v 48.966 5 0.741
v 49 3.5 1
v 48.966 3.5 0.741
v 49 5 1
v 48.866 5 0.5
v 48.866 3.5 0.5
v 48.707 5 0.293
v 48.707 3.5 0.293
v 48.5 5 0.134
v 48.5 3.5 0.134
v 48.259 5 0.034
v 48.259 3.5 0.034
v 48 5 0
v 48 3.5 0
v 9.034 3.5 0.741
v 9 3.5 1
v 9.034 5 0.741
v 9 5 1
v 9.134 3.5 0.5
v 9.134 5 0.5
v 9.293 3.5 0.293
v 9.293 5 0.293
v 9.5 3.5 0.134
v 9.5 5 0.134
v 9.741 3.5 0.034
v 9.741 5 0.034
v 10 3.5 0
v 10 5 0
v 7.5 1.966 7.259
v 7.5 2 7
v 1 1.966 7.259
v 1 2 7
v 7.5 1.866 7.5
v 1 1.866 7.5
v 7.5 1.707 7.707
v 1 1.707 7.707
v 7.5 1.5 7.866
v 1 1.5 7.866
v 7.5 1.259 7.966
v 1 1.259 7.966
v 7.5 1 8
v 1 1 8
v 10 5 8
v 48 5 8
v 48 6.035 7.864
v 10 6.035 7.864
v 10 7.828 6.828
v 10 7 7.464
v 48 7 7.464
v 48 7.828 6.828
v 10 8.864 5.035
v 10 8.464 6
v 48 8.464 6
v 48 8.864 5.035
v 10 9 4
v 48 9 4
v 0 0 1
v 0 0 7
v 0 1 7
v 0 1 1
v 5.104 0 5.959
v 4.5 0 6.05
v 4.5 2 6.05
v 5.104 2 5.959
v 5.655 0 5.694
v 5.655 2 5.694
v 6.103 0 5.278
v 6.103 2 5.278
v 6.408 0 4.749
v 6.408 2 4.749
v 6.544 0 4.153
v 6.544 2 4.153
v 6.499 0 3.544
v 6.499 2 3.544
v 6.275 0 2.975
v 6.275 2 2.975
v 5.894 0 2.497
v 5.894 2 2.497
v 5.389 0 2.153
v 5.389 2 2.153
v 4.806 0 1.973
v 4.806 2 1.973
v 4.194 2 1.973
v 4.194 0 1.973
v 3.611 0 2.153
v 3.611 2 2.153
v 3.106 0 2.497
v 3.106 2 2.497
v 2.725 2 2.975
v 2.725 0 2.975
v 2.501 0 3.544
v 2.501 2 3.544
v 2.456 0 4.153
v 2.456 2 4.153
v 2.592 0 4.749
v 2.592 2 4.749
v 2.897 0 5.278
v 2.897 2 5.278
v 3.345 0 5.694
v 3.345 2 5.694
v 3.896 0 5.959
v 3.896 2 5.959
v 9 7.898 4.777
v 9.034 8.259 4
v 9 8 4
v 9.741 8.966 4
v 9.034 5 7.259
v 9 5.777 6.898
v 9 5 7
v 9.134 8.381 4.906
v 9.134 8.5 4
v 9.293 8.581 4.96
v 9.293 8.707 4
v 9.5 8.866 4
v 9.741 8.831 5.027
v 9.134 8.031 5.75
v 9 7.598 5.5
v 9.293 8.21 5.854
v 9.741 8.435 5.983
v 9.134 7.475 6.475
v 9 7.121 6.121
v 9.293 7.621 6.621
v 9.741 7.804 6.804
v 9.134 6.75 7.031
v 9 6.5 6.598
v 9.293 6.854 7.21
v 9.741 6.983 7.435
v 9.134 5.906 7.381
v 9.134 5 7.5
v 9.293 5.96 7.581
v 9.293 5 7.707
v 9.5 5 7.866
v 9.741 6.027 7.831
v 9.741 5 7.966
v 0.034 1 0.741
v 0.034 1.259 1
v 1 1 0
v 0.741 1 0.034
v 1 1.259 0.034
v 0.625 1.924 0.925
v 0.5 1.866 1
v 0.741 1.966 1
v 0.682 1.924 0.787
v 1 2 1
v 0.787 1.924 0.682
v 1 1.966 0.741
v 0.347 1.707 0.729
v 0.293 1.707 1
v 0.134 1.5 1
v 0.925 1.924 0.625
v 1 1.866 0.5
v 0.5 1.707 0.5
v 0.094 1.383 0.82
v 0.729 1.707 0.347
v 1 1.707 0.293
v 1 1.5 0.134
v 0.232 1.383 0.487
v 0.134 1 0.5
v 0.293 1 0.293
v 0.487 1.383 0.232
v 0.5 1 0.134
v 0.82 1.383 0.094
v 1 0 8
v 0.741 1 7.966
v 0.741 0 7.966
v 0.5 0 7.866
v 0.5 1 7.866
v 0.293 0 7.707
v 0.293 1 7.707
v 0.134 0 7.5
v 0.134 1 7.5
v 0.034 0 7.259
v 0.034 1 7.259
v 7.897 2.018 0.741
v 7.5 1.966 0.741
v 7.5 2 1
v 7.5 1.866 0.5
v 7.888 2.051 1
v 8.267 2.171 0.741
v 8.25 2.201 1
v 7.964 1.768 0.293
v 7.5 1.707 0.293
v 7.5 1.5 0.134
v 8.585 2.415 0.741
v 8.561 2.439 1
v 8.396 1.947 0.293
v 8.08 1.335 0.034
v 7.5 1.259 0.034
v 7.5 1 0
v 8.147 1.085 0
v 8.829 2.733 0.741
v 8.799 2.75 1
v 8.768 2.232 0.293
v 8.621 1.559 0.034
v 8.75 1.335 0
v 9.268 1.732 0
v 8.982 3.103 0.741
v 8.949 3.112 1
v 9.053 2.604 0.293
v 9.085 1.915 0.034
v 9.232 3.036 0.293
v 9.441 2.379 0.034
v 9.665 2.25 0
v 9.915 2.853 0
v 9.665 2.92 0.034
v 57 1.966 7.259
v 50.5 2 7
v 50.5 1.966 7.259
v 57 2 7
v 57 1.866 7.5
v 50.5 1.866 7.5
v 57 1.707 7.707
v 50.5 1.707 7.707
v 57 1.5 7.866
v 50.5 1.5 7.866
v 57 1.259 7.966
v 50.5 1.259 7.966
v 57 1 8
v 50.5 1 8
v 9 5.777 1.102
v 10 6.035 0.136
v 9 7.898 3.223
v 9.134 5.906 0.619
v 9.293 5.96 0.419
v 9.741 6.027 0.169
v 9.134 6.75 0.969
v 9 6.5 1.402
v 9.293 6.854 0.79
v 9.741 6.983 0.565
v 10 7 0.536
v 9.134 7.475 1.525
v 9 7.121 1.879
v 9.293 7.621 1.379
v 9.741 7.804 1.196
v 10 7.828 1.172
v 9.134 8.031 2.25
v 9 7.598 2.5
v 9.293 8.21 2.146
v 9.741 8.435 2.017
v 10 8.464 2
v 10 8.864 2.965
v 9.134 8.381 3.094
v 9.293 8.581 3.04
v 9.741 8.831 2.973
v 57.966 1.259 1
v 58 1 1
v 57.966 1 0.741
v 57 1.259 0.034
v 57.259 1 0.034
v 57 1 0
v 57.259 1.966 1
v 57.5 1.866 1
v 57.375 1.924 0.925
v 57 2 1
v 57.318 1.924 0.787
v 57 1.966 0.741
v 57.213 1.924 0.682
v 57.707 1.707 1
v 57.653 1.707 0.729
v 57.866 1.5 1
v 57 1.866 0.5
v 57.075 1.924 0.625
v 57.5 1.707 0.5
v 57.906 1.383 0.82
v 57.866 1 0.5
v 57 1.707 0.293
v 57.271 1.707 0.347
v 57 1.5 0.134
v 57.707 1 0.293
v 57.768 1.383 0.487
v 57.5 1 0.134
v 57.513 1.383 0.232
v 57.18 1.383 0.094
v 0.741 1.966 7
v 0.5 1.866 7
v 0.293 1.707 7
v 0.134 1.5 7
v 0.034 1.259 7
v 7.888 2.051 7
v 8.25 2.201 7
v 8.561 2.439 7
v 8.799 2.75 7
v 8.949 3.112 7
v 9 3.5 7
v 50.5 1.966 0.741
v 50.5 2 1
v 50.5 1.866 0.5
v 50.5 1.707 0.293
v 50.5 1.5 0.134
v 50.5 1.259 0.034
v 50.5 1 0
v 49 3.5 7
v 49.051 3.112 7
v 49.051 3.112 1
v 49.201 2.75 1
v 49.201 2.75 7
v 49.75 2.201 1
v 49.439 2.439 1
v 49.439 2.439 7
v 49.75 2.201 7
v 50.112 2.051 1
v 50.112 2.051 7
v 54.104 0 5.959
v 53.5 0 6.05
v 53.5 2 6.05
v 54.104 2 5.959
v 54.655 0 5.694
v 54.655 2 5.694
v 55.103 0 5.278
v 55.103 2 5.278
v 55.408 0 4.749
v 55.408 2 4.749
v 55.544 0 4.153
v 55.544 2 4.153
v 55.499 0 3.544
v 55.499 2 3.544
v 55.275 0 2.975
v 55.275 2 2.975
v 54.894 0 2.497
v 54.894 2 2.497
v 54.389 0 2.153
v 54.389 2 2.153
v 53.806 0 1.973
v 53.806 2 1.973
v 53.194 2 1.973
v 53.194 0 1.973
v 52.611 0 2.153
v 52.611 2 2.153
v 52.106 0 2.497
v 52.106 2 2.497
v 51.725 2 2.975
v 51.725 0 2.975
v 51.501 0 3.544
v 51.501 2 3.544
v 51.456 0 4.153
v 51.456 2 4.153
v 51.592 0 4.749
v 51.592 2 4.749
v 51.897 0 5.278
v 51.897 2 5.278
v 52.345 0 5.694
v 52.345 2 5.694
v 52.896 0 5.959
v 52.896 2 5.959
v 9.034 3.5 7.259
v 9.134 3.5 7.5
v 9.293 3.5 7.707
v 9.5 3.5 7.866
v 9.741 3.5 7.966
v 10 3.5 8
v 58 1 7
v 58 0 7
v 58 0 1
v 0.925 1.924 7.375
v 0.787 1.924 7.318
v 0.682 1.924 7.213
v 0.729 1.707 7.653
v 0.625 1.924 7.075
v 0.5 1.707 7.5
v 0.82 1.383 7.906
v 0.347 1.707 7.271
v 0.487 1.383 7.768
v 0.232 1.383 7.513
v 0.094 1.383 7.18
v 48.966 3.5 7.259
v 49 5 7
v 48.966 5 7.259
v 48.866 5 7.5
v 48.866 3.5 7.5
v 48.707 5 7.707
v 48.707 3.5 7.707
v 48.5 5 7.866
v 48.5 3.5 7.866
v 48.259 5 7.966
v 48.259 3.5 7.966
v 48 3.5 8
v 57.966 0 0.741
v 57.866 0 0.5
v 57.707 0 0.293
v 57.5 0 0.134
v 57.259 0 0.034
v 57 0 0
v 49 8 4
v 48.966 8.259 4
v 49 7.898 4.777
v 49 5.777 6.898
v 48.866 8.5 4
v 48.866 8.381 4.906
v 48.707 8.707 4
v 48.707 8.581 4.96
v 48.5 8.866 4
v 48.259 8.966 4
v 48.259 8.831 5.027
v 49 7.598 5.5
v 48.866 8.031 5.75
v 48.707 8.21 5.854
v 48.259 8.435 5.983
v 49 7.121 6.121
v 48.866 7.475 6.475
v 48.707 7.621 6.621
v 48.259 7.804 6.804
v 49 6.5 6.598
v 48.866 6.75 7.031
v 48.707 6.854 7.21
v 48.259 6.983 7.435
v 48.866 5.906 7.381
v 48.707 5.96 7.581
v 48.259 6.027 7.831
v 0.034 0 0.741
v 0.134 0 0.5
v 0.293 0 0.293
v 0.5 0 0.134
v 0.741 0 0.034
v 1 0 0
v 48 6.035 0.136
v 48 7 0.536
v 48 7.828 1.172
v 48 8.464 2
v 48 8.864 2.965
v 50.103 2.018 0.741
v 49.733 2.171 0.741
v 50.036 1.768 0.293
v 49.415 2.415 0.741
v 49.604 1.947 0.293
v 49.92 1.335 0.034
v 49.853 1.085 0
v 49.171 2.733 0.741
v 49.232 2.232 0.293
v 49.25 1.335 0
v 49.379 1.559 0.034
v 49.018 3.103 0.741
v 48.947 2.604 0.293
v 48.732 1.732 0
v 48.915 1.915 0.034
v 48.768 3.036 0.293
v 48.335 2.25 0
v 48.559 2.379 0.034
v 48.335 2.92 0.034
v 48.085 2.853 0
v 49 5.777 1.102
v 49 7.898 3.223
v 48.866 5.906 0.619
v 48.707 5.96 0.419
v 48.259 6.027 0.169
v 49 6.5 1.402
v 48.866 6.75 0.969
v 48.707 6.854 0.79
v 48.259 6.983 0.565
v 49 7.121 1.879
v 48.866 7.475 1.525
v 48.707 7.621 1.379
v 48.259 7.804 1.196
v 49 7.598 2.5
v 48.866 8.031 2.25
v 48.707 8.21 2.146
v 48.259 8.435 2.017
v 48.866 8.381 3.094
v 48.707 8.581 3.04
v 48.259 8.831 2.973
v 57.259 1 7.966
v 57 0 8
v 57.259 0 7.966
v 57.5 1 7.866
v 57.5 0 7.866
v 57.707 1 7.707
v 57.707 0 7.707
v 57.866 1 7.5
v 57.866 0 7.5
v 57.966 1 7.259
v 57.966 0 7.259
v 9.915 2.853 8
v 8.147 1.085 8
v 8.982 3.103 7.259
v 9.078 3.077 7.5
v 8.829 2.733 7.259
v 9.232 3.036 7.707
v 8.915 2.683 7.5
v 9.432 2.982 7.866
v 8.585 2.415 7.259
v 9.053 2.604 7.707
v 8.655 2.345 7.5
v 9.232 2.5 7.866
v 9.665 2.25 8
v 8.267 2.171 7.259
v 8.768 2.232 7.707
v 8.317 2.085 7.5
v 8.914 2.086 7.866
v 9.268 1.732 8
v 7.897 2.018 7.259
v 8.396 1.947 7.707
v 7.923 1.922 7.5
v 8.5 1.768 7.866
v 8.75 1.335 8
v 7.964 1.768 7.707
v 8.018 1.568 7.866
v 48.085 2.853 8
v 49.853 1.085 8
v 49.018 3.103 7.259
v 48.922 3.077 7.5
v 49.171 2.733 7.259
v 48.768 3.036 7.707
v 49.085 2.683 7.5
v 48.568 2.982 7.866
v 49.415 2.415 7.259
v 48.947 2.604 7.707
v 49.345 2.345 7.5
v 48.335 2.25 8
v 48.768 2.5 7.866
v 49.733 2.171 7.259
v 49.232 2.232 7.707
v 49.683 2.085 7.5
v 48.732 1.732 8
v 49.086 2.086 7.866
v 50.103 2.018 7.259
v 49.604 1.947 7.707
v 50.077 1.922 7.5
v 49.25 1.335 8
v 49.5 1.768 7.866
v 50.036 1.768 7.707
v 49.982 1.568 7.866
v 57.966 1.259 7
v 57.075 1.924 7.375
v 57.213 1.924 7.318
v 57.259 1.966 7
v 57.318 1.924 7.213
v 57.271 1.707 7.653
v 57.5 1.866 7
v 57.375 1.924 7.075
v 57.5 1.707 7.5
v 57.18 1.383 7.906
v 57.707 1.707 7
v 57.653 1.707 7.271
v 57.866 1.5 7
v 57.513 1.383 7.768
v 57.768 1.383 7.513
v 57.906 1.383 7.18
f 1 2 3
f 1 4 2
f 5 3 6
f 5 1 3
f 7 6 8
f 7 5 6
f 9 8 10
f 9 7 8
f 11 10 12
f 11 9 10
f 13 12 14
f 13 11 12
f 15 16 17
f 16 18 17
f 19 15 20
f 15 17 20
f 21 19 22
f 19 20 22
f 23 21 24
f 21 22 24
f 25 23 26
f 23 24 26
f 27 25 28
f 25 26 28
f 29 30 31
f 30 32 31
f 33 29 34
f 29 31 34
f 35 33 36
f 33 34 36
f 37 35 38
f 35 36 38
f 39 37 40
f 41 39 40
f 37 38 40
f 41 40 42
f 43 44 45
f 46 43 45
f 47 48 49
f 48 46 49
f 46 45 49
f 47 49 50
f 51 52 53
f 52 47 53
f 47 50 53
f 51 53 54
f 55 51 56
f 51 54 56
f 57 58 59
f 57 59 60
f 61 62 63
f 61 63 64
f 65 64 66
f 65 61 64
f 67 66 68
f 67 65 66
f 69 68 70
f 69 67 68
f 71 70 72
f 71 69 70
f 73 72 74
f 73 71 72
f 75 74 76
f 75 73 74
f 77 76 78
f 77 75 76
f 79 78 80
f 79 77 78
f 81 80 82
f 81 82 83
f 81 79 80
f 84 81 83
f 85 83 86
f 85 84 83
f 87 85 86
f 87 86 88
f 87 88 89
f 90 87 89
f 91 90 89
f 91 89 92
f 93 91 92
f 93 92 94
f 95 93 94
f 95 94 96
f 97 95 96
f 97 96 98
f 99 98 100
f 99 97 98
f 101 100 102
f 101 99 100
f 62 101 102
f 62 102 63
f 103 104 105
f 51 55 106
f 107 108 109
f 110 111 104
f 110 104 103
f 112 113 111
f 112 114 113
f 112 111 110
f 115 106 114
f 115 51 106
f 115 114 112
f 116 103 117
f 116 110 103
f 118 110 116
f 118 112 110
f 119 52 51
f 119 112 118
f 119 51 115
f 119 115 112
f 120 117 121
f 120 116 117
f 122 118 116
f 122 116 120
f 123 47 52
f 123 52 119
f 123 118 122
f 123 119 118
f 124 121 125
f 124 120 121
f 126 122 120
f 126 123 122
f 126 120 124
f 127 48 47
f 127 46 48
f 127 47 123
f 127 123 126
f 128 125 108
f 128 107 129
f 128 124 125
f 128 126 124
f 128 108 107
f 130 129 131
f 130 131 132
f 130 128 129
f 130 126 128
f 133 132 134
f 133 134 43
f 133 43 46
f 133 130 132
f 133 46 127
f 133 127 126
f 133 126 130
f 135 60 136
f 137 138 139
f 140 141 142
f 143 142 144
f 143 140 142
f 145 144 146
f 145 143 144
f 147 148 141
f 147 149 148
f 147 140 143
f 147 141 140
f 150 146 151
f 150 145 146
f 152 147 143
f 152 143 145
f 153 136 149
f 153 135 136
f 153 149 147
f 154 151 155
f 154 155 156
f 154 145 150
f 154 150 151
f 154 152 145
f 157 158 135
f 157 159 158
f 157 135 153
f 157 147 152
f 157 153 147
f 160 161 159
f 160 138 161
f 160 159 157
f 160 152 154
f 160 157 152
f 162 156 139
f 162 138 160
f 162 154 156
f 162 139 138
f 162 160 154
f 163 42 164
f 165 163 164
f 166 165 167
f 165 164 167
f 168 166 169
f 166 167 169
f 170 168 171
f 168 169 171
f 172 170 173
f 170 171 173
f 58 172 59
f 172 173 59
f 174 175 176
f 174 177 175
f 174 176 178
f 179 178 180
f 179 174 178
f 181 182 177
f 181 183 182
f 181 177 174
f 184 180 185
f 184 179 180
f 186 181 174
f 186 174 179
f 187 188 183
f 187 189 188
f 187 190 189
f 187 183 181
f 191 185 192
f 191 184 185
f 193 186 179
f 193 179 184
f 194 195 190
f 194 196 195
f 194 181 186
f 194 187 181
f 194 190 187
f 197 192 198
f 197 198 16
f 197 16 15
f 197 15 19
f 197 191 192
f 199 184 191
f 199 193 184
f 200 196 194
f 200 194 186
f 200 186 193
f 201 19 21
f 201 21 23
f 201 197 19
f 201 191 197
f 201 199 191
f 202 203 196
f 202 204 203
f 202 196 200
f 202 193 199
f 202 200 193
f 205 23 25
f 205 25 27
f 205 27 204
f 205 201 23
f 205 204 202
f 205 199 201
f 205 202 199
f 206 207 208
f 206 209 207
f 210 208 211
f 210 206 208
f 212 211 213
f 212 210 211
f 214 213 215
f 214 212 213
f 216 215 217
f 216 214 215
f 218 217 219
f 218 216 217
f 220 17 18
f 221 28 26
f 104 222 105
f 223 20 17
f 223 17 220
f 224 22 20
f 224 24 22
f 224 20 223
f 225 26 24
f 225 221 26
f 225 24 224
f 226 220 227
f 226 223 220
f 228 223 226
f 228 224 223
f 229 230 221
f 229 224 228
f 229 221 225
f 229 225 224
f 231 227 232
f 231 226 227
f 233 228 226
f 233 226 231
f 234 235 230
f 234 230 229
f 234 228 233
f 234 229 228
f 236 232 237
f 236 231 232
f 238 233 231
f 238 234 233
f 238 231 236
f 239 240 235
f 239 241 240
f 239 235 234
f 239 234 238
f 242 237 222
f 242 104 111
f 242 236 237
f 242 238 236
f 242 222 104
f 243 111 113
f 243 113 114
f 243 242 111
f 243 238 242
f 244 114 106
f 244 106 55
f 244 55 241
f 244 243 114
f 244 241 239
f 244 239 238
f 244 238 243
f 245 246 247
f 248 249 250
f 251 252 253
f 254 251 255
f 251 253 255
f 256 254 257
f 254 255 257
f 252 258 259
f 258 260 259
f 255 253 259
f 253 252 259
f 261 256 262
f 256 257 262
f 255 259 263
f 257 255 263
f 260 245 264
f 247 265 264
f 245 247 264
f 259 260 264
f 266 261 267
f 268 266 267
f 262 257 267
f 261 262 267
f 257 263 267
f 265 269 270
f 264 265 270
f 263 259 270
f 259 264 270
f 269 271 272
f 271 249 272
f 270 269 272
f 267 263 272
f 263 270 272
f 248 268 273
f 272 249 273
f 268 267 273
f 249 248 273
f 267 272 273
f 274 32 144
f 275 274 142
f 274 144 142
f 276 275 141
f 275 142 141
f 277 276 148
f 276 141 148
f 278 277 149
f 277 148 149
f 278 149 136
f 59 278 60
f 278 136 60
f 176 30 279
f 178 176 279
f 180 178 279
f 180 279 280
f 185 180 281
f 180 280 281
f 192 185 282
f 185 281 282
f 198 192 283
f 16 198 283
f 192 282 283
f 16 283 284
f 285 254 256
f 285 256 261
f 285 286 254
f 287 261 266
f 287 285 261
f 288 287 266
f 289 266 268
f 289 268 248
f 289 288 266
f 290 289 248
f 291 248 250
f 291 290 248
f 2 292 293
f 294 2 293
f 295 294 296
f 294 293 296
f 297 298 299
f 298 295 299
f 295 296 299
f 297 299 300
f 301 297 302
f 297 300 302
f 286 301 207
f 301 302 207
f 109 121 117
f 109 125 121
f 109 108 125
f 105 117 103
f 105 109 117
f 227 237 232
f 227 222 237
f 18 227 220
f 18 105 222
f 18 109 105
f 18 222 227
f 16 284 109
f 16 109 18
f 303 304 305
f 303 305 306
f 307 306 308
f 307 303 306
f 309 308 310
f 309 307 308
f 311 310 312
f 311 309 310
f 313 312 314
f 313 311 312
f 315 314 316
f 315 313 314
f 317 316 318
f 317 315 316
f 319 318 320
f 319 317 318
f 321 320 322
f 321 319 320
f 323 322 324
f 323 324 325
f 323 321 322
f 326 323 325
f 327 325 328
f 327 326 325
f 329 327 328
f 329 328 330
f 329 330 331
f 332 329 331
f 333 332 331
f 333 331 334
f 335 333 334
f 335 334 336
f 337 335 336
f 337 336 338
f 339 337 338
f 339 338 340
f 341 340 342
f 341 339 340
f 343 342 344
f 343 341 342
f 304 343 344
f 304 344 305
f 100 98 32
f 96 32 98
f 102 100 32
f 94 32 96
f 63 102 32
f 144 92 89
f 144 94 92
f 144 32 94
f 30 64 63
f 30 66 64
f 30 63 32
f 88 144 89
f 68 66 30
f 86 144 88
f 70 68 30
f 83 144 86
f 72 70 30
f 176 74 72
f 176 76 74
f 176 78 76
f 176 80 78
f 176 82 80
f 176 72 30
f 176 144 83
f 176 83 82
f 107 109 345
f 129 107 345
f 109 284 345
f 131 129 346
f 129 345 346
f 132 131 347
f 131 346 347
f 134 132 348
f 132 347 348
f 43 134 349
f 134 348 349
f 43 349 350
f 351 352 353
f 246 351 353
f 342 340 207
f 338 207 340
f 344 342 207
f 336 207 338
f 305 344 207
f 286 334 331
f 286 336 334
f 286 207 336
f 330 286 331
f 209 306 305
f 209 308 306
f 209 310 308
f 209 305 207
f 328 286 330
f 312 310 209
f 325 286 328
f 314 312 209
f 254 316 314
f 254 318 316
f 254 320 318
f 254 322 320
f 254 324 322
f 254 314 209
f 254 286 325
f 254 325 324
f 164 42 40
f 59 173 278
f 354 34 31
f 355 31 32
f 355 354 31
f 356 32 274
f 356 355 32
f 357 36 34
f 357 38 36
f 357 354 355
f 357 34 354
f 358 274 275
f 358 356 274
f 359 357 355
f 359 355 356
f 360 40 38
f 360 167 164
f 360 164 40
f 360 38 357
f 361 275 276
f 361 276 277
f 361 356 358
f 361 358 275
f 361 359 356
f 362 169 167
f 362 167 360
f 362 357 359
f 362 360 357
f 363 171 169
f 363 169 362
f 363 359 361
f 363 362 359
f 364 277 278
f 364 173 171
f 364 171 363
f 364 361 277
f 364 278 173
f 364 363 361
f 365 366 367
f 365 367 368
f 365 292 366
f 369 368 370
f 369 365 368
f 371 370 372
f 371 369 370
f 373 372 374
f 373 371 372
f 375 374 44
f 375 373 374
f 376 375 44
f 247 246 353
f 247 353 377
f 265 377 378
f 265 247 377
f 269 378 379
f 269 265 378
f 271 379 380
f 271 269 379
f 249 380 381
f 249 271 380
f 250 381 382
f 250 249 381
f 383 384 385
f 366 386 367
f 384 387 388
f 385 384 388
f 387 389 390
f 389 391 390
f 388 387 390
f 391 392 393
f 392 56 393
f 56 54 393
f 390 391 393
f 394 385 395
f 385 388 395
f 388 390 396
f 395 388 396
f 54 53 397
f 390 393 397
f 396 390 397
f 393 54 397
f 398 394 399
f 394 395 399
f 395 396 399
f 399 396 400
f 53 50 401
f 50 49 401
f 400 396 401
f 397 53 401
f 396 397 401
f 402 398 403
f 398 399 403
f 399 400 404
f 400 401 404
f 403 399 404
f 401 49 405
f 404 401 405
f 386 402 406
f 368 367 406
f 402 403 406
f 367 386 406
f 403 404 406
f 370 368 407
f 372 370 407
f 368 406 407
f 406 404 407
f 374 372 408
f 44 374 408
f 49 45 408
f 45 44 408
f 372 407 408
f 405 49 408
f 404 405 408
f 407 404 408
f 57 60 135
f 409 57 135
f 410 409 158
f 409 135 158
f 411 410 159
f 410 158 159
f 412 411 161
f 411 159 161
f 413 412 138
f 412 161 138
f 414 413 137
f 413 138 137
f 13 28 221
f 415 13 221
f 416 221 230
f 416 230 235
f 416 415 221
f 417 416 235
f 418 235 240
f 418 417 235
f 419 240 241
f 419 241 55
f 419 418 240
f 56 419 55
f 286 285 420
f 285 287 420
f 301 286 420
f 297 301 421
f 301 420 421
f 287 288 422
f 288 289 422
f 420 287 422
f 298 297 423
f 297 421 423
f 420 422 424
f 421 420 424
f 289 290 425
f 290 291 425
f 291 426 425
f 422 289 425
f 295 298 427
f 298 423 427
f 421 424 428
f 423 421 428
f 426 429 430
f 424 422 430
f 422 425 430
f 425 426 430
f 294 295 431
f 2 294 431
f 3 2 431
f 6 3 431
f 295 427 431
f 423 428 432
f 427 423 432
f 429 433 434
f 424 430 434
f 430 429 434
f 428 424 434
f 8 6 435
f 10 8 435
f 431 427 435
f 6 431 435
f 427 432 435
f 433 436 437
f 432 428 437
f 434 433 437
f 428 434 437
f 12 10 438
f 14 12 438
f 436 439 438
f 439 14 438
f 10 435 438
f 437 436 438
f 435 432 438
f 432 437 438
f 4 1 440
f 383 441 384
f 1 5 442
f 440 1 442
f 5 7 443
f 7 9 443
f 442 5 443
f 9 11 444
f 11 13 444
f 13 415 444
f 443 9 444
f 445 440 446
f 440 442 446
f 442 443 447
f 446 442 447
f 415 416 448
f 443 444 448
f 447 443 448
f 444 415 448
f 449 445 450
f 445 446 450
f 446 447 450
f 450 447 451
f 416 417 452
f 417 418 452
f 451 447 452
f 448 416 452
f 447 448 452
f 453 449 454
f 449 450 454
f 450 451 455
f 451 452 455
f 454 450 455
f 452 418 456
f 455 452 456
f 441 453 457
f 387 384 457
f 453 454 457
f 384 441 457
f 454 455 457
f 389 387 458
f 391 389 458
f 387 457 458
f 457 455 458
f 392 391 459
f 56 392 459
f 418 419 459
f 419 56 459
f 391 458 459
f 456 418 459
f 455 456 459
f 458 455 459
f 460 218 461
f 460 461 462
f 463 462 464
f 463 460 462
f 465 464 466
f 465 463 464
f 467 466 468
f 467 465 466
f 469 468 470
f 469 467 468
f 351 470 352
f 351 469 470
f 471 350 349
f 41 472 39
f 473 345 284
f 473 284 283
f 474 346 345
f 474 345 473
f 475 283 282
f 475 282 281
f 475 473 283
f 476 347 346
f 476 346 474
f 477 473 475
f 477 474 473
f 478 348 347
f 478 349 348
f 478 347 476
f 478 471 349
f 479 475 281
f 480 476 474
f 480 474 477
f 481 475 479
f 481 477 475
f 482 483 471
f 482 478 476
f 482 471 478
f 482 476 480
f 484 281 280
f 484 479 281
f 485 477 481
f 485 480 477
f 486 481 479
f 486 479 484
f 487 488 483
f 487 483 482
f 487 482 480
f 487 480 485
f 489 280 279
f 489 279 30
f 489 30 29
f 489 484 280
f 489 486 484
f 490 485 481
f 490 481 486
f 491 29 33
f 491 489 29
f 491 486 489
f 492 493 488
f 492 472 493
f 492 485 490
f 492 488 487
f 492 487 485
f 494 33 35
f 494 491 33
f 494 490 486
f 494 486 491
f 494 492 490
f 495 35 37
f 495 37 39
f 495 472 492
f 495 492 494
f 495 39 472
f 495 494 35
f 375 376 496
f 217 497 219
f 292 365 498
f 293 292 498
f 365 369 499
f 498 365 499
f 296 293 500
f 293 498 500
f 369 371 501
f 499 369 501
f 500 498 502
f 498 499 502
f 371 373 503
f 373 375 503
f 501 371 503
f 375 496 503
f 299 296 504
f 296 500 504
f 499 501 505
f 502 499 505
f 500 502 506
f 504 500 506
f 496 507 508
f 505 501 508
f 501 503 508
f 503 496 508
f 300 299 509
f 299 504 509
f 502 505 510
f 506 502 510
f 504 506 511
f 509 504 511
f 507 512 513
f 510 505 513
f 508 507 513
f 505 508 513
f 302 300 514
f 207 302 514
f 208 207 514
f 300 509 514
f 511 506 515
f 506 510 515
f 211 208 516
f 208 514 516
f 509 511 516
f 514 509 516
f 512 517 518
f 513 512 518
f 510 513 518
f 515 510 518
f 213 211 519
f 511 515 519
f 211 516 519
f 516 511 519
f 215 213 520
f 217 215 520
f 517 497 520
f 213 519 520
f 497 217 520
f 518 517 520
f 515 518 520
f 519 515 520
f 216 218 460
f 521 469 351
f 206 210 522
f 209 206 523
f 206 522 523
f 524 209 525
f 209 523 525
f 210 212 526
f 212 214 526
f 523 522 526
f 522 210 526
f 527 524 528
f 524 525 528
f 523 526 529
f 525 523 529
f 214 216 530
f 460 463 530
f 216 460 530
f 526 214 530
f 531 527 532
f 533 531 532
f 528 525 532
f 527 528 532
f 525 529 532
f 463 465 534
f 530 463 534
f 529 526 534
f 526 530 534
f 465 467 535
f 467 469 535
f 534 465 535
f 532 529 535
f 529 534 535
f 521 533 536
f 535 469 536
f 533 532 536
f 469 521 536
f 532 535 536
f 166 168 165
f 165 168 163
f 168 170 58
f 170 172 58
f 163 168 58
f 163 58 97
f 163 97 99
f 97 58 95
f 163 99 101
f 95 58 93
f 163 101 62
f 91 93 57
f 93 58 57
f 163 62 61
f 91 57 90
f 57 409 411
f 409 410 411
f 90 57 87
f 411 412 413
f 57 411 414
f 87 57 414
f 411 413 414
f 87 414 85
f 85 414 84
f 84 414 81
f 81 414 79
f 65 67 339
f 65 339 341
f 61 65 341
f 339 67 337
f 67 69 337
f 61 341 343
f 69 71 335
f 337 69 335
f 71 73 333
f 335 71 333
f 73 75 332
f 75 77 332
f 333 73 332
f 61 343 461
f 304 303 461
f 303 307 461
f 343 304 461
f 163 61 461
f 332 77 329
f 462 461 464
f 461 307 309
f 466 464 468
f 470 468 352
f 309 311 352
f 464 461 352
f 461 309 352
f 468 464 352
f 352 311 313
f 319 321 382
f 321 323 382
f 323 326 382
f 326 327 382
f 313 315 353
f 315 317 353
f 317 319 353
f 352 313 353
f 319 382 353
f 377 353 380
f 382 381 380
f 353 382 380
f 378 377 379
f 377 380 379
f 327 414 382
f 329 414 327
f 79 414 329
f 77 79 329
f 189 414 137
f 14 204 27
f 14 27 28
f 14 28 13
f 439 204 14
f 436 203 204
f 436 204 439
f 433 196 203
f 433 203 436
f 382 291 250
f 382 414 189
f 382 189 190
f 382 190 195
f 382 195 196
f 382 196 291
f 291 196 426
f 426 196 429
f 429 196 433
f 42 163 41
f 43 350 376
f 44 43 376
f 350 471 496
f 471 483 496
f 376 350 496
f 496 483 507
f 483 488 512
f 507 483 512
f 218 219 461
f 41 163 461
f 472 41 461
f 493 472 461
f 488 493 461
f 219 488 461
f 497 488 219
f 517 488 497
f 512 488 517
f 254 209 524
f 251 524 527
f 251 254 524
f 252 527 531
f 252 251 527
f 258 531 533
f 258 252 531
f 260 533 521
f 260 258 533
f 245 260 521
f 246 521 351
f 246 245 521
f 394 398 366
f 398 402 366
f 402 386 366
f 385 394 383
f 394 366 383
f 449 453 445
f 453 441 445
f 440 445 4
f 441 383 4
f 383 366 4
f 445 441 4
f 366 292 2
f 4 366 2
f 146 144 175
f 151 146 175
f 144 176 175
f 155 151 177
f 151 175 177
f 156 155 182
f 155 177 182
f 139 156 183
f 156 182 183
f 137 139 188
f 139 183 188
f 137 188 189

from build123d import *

# Parameters (mm, degrees)
SKETCH1_W           = 40
SKETCH1_H           = 8
SKETCH1_W_2         = 9
SKETCH1_R           = 2.05
BOSS_EXTRUDE1_DEPTH = 2
SKETCH1_3_W         = 40
SKETCH1_3_H         = 8
BOSS_EXTRUDE2_DEPTH = 9
FILLET1_R           = 4
FILLET2_R           = 1
FILLET4_R           = 1.5
FILLET5_R           = 1


with BuildPart() as part:
    # Sketch1 → Boss-Extrude1 (new body)
    # profile 1 of 3: a face of its own
    with BuildSketch(Plane(origin=(0, 0, 0), x_dir=(1, 0, 0), z_dir=(0, 1, 0))):
        with Locations((29, -4)):
            Rectangle(SKETCH1_W, SKETCH1_H)
    # profile 2 of 3: a face of its own
    with BuildSketch(Plane(origin=(0, 0, 0), x_dir=(1, 0, 0), z_dir=(0, 1, 0))):
        with Locations((4.5, -4)):
            Rectangle(SKETCH1_W_2, SKETCH1_H)
        with Locations(Location((4.5, -4, 0), (0, 0, 270))):
            Circle(SKETCH1_R, mode=Mode.SUBTRACT)
    # profile 3 of 3: a face of its own
    with BuildSketch(Plane(origin=(0, 0, 0), x_dir=(1, 0, 0), z_dir=(0, 1, 0))):
        with Locations((53.5, -4)):
            Rectangle(SKETCH1_W_2, SKETCH1_H)
        with Locations(Location((53.5, -4, 0), (0, 0, 270))):
            Circle(SKETCH1_R, mode=Mode.SUBTRACT)
    extrude(amount=BOSS_EXTRUDE1_DEPTH)

    # Sketch1<3> → Boss-Extrude2 (add)
    with BuildSketch(Plane(origin=(0, 0, 0), x_dir=(1, 0, 0), z_dir=(0, 1, 0))):
        with Locations((29, -4)):
            Rectangle(SKETCH1_3_W, SKETCH1_3_H)
    extrude(amount=BOSS_EXTRUDE2_DEPTH)

    # Fillet1
    fillet1_edges = [part.edges().sort_by_distance(p)[0] for p in [
        (29, 9, 0),
        (29, 9, 8),
    ]]
    fillet(fillet1_edges, radius=FILLET1_R - 0.0001)  # a hair under: the kernel refuses the full size

    # Fillet2
    fillet2_edges = [part.edges().sort_by_distance(p)[0] for p in [
        (0, 1, 8),
        (0, 1, 0),
        (58, 1, 0),
        (58, 1, 8),
    ]]
    fillet(fillet2_edges, radius=FILLET2_R)

    # Fillet4
    fillet4_edges = [part.edges().sort_by_distance(p)[0] for p in [
        (9, 2, 4),
        (49, 2, 4),
    ]]
    fillet(fillet4_edges, radius=FILLET4_R)

    # Fillet5
    fillet5_edges = [part.edges().sort_by_distance(p)[0] for p in [
        (9, 4.25005, 0),
        (49, 4.25005, 0),
        (49, 4.25005, 8),
        (49, 7.828456414, 6.828456414),
        (49, 7.828456414, 1.171543586),
        (9, 4.25005, 8),
        (9, 7.828456414, 6.828456414),
        (9, 7.828456414, 1.171543586),
        (4.25, 2, 0),
        (58, 2, 4),
        (57.707106781, 2, 7.707106781),
        (57.707106781, 2, 0.292893219),
        (4.25, 2, 8),
        (0, 2, 4),
        (0.292893219, 2, 7.707106781),
        (0.292893219, 2, 0.292893219),
        (53.75, 2, 0),
        (53.75, 2, 8),
        (49.439339828, 2.439339828, 0),
        (49.439339828, 2.439339828, 8),
        (8.560660172, 2.439339828, 0),
        (8.560660172, 2.439339828, 8),
    ]]
    fillet(fillet5_edges, radius=FILLET5_R)


solid = part.part
